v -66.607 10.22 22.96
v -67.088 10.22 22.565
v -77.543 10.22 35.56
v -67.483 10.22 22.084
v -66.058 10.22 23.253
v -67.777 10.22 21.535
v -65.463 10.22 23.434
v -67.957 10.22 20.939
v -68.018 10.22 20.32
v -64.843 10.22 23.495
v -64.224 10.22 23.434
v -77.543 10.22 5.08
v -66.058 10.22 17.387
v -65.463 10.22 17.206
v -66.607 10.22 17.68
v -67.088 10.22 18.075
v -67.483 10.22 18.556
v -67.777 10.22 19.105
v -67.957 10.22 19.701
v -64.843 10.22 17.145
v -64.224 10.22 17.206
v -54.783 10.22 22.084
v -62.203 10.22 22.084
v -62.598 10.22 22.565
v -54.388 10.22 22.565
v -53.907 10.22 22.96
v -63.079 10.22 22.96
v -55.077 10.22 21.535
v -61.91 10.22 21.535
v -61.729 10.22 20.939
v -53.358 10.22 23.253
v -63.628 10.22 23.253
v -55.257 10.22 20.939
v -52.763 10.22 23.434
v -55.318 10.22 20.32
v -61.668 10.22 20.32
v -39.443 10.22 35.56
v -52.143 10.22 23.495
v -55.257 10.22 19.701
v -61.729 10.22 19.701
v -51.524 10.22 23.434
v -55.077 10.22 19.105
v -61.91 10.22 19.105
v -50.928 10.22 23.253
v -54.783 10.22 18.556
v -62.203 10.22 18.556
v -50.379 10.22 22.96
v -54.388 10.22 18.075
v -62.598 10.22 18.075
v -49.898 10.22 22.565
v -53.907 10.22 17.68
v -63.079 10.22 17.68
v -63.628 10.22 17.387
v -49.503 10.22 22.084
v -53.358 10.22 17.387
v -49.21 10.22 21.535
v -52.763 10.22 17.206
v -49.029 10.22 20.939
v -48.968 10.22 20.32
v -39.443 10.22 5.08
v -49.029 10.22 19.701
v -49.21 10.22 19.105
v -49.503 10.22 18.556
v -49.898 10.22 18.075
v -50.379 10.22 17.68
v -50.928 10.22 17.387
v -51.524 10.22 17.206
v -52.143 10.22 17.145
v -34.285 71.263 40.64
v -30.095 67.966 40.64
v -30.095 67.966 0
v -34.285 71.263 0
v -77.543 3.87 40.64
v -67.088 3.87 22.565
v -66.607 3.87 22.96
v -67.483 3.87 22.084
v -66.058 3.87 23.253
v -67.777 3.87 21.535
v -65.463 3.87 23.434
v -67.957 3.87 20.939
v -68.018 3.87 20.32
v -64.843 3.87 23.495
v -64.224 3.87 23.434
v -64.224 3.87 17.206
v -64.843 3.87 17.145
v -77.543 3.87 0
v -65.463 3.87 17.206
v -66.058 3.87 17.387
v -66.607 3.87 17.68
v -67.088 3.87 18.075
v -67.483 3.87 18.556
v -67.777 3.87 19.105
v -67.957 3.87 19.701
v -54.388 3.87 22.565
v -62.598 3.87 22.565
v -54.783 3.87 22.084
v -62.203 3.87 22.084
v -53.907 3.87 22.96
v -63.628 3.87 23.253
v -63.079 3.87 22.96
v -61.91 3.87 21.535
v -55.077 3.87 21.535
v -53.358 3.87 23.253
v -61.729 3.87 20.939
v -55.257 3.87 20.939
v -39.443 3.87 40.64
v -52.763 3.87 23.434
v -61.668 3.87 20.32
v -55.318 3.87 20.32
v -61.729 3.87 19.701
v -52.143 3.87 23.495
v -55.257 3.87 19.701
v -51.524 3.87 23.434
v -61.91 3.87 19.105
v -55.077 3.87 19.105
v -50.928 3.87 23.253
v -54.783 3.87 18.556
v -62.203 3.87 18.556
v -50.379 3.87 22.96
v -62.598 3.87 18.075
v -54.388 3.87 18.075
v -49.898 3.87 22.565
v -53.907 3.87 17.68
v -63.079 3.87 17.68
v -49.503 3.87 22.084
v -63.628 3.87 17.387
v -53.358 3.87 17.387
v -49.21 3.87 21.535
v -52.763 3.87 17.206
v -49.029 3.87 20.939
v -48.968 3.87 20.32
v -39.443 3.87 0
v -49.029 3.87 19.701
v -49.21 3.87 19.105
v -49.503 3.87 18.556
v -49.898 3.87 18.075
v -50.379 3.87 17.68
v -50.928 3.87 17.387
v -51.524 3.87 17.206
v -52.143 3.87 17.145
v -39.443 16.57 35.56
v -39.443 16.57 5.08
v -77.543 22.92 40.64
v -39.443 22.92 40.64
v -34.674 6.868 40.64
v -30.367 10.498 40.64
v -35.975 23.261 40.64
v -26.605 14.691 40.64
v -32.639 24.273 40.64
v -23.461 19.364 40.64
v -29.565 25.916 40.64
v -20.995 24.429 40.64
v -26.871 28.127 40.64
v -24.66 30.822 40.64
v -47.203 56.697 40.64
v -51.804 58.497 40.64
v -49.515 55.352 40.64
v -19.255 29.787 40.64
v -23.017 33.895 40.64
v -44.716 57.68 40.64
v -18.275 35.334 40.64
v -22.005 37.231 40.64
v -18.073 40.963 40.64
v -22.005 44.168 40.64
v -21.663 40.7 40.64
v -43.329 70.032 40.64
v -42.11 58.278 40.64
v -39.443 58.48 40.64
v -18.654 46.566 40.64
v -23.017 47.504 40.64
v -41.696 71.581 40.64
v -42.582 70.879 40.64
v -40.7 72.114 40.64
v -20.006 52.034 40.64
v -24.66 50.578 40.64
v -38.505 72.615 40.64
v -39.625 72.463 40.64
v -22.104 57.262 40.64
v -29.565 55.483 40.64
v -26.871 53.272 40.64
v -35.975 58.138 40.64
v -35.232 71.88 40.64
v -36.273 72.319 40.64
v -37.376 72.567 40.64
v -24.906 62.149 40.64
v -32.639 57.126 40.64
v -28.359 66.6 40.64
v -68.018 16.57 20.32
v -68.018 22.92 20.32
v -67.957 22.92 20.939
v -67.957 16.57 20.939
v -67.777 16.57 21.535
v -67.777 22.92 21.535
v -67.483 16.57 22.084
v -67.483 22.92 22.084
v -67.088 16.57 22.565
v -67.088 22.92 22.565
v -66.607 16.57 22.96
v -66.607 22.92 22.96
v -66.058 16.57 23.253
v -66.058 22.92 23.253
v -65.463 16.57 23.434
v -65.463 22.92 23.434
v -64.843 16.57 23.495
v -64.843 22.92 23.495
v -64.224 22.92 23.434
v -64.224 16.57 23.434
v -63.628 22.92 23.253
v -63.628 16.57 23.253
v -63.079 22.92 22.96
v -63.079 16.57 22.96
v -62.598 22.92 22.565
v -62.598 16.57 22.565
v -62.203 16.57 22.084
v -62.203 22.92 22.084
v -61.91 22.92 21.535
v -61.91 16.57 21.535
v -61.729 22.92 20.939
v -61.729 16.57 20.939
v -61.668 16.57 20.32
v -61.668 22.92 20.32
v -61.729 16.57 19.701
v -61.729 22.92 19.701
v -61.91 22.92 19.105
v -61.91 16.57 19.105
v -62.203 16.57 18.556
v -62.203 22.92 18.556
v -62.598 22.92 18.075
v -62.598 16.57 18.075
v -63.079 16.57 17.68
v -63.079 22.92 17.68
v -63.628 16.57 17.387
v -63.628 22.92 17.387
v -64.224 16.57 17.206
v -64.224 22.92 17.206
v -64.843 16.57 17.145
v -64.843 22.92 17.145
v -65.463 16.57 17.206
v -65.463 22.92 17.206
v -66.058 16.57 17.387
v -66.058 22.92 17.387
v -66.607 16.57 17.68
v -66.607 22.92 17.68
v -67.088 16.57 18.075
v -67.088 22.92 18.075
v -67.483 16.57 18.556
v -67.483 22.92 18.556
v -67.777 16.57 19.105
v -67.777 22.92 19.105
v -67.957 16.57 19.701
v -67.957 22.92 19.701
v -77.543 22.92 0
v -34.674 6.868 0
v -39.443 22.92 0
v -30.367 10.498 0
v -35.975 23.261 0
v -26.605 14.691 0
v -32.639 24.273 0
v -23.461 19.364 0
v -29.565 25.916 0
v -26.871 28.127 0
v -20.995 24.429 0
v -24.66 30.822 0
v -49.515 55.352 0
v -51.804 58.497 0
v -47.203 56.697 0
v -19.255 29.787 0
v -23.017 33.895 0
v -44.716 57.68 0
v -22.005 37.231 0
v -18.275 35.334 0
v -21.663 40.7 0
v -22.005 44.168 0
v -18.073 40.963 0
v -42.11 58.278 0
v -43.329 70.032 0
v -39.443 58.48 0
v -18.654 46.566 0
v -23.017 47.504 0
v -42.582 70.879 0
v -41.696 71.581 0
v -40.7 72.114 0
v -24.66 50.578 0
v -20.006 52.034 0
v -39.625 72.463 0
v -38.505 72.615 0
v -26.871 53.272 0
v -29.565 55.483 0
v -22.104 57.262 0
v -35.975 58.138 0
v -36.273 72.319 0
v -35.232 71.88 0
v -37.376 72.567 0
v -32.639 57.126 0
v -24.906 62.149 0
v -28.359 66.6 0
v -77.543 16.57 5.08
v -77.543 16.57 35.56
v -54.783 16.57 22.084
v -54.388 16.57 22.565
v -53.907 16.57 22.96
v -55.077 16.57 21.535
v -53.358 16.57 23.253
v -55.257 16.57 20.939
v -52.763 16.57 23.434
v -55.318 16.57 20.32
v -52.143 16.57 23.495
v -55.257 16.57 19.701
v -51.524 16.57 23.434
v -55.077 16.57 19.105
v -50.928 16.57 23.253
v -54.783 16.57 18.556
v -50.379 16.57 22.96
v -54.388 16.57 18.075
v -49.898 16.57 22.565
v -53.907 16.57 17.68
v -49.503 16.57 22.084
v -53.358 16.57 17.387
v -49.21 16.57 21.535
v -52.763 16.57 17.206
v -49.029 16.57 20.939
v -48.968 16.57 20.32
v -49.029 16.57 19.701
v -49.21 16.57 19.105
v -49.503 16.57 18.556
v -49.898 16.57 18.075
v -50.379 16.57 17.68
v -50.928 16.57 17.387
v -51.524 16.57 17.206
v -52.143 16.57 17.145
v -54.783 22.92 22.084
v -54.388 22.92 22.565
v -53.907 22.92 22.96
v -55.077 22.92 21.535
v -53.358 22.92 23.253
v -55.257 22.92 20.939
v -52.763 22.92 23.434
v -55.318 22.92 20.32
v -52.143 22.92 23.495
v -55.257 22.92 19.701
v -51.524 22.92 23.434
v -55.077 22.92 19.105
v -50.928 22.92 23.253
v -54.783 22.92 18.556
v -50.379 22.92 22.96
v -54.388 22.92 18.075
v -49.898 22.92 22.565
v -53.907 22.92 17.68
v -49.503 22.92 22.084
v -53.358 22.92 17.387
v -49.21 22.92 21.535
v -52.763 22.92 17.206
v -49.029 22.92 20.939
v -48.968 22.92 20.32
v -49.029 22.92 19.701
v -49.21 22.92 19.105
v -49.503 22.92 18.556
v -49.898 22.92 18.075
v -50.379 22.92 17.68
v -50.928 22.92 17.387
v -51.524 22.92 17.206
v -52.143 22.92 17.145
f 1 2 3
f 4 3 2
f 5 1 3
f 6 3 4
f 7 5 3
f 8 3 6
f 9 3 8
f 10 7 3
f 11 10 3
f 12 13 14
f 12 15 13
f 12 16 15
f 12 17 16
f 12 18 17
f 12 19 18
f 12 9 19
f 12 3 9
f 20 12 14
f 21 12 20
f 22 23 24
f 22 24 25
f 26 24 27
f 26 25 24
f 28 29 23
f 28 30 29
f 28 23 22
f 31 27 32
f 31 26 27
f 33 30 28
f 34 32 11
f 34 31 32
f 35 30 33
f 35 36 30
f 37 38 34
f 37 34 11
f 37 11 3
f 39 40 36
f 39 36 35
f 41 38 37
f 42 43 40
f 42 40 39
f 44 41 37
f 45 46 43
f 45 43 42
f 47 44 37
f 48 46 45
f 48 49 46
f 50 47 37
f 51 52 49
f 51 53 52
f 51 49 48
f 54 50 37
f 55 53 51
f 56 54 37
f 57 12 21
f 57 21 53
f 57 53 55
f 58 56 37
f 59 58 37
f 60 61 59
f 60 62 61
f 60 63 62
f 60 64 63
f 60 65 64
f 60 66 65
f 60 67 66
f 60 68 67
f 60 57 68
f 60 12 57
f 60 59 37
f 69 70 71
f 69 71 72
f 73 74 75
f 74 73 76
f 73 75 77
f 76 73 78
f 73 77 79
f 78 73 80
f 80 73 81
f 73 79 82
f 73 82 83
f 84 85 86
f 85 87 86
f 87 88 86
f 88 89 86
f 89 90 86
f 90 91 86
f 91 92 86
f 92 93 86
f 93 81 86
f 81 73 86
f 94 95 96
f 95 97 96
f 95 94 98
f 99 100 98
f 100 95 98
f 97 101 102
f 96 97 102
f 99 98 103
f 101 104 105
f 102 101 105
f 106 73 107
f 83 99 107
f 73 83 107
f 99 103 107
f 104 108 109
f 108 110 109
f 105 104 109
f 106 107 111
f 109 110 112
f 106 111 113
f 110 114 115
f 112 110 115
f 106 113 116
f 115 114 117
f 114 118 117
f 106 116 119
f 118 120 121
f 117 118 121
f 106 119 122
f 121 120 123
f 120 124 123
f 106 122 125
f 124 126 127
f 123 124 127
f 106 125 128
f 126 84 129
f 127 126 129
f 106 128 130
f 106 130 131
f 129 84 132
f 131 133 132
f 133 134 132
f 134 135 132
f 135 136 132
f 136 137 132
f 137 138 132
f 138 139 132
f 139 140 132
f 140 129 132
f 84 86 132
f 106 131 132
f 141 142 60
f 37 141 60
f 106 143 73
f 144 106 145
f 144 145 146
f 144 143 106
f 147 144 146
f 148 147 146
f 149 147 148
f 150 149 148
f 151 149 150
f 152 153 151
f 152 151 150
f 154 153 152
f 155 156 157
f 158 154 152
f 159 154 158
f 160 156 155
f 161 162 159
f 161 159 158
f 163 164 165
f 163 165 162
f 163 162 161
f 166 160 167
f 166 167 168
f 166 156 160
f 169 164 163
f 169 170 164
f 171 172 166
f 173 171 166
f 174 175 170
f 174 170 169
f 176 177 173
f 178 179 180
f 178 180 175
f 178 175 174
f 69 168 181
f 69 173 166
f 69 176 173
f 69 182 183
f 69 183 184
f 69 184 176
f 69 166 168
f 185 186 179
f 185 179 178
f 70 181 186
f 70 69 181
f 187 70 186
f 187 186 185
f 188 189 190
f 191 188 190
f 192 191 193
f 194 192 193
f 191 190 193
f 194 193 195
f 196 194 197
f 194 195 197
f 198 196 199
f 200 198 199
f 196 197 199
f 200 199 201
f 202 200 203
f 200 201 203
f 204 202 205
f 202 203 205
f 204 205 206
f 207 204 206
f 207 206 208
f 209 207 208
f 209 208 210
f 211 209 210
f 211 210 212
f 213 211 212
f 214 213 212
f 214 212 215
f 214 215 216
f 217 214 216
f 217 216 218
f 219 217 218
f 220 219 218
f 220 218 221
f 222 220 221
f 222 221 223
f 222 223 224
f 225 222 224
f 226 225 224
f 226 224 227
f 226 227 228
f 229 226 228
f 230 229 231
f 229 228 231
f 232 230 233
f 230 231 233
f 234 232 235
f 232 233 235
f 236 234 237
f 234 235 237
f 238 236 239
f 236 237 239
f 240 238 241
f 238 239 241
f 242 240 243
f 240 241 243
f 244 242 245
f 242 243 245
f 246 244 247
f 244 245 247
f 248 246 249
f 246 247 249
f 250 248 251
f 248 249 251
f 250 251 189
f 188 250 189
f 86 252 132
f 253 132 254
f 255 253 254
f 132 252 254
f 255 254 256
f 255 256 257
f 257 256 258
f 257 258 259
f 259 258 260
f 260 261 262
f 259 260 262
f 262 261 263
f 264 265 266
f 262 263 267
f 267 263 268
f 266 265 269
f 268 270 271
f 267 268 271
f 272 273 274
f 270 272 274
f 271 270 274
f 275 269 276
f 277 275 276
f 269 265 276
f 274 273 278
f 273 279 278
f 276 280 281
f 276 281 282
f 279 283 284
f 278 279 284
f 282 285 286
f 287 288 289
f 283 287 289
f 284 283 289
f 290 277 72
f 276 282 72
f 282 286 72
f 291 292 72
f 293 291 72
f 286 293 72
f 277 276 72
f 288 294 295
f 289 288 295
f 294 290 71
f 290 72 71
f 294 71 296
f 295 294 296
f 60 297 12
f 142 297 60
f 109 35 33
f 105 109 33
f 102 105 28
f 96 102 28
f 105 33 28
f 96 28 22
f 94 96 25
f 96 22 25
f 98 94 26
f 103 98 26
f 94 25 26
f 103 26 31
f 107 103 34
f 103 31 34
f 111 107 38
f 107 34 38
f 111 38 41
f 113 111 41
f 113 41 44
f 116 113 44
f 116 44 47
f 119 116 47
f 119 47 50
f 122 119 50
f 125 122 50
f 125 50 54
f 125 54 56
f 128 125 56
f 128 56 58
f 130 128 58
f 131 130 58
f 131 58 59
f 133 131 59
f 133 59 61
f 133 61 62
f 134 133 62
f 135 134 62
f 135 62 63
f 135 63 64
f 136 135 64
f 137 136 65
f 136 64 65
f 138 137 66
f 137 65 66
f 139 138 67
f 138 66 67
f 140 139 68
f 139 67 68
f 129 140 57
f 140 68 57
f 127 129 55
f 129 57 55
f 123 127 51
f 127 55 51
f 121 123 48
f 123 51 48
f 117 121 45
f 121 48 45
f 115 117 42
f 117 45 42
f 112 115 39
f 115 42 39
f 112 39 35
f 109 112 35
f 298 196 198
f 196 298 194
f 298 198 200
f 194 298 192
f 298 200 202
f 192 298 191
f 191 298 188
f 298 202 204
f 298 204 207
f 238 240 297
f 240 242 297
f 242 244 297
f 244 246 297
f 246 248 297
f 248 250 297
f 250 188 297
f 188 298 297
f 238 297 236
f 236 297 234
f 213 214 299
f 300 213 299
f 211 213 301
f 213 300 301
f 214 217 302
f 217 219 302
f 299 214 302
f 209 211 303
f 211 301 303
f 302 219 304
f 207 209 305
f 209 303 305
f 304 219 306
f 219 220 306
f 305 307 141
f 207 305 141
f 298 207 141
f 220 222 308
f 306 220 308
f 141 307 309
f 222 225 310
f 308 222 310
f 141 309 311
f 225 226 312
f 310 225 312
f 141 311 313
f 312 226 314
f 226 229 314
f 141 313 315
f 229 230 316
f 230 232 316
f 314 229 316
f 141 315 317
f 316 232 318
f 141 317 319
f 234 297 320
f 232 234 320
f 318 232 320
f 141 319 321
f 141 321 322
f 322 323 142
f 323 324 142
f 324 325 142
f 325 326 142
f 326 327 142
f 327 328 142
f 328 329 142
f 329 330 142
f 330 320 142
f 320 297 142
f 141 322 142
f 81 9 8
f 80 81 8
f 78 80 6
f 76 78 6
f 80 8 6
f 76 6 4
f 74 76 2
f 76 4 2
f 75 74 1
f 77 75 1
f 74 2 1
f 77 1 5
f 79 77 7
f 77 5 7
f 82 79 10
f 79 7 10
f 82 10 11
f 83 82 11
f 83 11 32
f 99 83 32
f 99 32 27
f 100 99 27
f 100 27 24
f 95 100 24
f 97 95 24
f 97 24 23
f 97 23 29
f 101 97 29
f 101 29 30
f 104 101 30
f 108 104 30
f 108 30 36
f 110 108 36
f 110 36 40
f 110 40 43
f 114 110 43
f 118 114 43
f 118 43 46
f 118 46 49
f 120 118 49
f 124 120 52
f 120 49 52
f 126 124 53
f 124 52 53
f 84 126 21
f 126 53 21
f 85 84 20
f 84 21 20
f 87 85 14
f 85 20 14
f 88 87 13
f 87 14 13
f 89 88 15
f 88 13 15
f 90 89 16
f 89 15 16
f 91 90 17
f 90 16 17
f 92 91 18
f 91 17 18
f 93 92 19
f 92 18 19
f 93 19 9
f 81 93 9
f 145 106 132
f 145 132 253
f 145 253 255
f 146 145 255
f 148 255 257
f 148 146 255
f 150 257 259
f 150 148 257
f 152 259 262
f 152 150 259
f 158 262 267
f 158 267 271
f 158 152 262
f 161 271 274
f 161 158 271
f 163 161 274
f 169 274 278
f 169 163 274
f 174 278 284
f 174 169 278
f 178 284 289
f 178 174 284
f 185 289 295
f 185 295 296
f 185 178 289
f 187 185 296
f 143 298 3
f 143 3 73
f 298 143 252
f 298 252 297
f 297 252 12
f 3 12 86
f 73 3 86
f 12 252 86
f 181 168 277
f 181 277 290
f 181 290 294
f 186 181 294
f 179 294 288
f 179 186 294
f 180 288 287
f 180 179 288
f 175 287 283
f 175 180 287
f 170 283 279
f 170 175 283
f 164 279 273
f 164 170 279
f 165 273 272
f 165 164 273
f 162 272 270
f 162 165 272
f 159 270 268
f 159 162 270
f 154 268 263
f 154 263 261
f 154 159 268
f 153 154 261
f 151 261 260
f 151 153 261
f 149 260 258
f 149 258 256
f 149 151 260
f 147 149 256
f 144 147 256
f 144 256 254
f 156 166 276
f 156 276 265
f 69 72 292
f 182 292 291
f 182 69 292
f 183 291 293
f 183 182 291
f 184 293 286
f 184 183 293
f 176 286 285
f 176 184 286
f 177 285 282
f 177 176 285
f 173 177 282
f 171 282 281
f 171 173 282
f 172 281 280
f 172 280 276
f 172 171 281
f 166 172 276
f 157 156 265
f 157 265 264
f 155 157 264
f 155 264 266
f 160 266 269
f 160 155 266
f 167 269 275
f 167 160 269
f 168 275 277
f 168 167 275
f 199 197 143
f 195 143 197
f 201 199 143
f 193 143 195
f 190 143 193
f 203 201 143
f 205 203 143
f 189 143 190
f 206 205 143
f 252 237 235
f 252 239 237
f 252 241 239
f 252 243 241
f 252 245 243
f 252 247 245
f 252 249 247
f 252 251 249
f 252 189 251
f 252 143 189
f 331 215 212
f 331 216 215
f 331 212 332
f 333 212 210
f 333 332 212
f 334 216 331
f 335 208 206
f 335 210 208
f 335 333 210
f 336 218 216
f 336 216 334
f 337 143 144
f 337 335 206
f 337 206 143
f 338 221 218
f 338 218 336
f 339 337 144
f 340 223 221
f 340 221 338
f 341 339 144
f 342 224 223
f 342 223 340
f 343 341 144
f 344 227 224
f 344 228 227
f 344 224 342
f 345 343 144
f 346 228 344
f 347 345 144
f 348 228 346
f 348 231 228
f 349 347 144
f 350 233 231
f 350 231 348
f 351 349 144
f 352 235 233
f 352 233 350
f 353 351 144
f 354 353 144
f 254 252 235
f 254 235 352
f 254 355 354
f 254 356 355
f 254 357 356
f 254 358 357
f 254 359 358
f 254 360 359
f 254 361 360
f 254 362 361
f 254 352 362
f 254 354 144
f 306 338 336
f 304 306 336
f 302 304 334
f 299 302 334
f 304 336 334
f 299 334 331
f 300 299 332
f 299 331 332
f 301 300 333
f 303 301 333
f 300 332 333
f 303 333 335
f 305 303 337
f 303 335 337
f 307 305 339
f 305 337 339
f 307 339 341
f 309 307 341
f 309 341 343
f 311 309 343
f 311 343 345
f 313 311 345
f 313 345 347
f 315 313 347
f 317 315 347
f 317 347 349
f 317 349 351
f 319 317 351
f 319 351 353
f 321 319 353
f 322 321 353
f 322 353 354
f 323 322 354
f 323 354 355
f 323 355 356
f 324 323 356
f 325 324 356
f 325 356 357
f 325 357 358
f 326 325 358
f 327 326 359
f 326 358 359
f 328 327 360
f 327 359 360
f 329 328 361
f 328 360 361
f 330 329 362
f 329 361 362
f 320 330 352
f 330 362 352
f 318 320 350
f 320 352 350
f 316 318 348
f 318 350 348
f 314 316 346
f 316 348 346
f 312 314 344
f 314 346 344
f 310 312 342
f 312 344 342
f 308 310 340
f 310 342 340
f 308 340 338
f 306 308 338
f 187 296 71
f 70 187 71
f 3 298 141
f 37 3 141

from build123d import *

# Parameters (mm, degrees)
F1_DEPTH = 5.08
F2_W     = 38.1
F2_H     = 6.35
F3_DEPTH = 30.48
F4_W     = 38.1
F4_H     = 6.35
F4_H_2   = 12.7
F5_DEPTH = 5.08
F7_DEPTH = 40.64
F8_R     = 3.175
F9_DEPTH = 25.4


with BuildPart() as f1:
    # F0 (on Top) → F1 (new body)
    with BuildSketch(Plane.XY):
        Polygon((-77.543311, 10.219596), (-77.543311, 3.869596), (-39.443311, 3.869596), (-39.443311, 10.219596), (-39.443311, 16.569596), (-39.443311, 22.919596), (-77.543311, 22.919596), (-77.543311, 16.569596), align=None)
    extrude(amount=F1_DEPTH)

    # F2 (on face) → F3 (join)
    with BuildSketch(Plane.XY.offset(5.08)):
        with Locations((-58.493311, 19.744596)):
            Rectangle(F2_W, F2_H)
        with Locations((-58.493311, 7.044596)):
            Rectangle(F2_W, F2_H)
    extrude(amount=F3_DEPTH)

    # F4 (on face) → F5 (join)
    with BuildSketch(Plane.XY.offset(35.56)):
        with Locations((-58.493311, 7.044596)):
            Rectangle(F4_W, F4_H)
        with Locations((-58.493311, 16.569596)):
            Rectangle(F4_W, F4_H_2)
    extrude(amount=F5_DEPTH)

    # F6 (on face) → F7 (join, through all)
    with BuildSketch(Plane.XY.offset(40.64)):
        with BuildLine():
            ThreePointArc((-39.443311, 58.479596), (-21.663311, 40.699596), (-39.443311, 22.919596))
            Line((-39.443311, 22.919596), (-39.443311, 3.869596))
            ThreePointArc((-39.443311, 3.869596), (-18.668383, 32.543039), (-28.358519, 66.599833))
            Line((-28.358519, 66.599833), (-30.095377, 67.966251))
            ThreePointArc((-30.095377, 67.966251), (-36.355643, 67.8164), (-39.443311, 62.368493))
            Line((-39.443311, 62.368493), (-39.443311, 58.479596))
        make_face()
        with BuildLine():
            ThreePointArc((-51.803668, 58.497424), (-45.919491, 61.378092), (-39.443311, 62.368493))
            ThreePointArc((-39.443311, 62.368493), (-36.355643, 67.8164), (-30.095377, 67.966251))
            Line((-30.095377, 67.966251), (-34.285495, 71.262692))
            ThreePointArc((-34.285495, 71.262692), (-39.06814, 72.563992), (-43.329022, 70.031807))
            Line((-43.329022, 70.031807), (-51.803668, 58.497424))
        make_face()
        with BuildLine():
            ThreePointArc((-49.514539, 55.352199), (-44.716124, 57.679756), (-39.443311, 58.479596))
            Line((-39.443311, 58.479596), (-39.443311, 62.368493))
            ThreePointArc((-39.443311, 62.368493), (-45.919491, 61.378092), (-51.803668, 58.497424))
            Line((-51.803668, 58.497424), (-49.514539, 55.352199))
        make_face()
    extrude(amount=-F7_DEPTH)

    # F8 (on face) → F9 (cut)
    with BuildSketch(Plane(origin=(0, 22.919596, 0), x_dir=(-1, 0, 0), z_dir=(0, 1, 0))):
        with Locations((64.843311, 20.32)):
            Circle(F8_R)
        with Locations((52.143311, 20.32)):
            Circle(F8_R)
    extrude(amount=-F9_DEPTH, mode=Mode.SUBTRACT)


solid = f1.part
